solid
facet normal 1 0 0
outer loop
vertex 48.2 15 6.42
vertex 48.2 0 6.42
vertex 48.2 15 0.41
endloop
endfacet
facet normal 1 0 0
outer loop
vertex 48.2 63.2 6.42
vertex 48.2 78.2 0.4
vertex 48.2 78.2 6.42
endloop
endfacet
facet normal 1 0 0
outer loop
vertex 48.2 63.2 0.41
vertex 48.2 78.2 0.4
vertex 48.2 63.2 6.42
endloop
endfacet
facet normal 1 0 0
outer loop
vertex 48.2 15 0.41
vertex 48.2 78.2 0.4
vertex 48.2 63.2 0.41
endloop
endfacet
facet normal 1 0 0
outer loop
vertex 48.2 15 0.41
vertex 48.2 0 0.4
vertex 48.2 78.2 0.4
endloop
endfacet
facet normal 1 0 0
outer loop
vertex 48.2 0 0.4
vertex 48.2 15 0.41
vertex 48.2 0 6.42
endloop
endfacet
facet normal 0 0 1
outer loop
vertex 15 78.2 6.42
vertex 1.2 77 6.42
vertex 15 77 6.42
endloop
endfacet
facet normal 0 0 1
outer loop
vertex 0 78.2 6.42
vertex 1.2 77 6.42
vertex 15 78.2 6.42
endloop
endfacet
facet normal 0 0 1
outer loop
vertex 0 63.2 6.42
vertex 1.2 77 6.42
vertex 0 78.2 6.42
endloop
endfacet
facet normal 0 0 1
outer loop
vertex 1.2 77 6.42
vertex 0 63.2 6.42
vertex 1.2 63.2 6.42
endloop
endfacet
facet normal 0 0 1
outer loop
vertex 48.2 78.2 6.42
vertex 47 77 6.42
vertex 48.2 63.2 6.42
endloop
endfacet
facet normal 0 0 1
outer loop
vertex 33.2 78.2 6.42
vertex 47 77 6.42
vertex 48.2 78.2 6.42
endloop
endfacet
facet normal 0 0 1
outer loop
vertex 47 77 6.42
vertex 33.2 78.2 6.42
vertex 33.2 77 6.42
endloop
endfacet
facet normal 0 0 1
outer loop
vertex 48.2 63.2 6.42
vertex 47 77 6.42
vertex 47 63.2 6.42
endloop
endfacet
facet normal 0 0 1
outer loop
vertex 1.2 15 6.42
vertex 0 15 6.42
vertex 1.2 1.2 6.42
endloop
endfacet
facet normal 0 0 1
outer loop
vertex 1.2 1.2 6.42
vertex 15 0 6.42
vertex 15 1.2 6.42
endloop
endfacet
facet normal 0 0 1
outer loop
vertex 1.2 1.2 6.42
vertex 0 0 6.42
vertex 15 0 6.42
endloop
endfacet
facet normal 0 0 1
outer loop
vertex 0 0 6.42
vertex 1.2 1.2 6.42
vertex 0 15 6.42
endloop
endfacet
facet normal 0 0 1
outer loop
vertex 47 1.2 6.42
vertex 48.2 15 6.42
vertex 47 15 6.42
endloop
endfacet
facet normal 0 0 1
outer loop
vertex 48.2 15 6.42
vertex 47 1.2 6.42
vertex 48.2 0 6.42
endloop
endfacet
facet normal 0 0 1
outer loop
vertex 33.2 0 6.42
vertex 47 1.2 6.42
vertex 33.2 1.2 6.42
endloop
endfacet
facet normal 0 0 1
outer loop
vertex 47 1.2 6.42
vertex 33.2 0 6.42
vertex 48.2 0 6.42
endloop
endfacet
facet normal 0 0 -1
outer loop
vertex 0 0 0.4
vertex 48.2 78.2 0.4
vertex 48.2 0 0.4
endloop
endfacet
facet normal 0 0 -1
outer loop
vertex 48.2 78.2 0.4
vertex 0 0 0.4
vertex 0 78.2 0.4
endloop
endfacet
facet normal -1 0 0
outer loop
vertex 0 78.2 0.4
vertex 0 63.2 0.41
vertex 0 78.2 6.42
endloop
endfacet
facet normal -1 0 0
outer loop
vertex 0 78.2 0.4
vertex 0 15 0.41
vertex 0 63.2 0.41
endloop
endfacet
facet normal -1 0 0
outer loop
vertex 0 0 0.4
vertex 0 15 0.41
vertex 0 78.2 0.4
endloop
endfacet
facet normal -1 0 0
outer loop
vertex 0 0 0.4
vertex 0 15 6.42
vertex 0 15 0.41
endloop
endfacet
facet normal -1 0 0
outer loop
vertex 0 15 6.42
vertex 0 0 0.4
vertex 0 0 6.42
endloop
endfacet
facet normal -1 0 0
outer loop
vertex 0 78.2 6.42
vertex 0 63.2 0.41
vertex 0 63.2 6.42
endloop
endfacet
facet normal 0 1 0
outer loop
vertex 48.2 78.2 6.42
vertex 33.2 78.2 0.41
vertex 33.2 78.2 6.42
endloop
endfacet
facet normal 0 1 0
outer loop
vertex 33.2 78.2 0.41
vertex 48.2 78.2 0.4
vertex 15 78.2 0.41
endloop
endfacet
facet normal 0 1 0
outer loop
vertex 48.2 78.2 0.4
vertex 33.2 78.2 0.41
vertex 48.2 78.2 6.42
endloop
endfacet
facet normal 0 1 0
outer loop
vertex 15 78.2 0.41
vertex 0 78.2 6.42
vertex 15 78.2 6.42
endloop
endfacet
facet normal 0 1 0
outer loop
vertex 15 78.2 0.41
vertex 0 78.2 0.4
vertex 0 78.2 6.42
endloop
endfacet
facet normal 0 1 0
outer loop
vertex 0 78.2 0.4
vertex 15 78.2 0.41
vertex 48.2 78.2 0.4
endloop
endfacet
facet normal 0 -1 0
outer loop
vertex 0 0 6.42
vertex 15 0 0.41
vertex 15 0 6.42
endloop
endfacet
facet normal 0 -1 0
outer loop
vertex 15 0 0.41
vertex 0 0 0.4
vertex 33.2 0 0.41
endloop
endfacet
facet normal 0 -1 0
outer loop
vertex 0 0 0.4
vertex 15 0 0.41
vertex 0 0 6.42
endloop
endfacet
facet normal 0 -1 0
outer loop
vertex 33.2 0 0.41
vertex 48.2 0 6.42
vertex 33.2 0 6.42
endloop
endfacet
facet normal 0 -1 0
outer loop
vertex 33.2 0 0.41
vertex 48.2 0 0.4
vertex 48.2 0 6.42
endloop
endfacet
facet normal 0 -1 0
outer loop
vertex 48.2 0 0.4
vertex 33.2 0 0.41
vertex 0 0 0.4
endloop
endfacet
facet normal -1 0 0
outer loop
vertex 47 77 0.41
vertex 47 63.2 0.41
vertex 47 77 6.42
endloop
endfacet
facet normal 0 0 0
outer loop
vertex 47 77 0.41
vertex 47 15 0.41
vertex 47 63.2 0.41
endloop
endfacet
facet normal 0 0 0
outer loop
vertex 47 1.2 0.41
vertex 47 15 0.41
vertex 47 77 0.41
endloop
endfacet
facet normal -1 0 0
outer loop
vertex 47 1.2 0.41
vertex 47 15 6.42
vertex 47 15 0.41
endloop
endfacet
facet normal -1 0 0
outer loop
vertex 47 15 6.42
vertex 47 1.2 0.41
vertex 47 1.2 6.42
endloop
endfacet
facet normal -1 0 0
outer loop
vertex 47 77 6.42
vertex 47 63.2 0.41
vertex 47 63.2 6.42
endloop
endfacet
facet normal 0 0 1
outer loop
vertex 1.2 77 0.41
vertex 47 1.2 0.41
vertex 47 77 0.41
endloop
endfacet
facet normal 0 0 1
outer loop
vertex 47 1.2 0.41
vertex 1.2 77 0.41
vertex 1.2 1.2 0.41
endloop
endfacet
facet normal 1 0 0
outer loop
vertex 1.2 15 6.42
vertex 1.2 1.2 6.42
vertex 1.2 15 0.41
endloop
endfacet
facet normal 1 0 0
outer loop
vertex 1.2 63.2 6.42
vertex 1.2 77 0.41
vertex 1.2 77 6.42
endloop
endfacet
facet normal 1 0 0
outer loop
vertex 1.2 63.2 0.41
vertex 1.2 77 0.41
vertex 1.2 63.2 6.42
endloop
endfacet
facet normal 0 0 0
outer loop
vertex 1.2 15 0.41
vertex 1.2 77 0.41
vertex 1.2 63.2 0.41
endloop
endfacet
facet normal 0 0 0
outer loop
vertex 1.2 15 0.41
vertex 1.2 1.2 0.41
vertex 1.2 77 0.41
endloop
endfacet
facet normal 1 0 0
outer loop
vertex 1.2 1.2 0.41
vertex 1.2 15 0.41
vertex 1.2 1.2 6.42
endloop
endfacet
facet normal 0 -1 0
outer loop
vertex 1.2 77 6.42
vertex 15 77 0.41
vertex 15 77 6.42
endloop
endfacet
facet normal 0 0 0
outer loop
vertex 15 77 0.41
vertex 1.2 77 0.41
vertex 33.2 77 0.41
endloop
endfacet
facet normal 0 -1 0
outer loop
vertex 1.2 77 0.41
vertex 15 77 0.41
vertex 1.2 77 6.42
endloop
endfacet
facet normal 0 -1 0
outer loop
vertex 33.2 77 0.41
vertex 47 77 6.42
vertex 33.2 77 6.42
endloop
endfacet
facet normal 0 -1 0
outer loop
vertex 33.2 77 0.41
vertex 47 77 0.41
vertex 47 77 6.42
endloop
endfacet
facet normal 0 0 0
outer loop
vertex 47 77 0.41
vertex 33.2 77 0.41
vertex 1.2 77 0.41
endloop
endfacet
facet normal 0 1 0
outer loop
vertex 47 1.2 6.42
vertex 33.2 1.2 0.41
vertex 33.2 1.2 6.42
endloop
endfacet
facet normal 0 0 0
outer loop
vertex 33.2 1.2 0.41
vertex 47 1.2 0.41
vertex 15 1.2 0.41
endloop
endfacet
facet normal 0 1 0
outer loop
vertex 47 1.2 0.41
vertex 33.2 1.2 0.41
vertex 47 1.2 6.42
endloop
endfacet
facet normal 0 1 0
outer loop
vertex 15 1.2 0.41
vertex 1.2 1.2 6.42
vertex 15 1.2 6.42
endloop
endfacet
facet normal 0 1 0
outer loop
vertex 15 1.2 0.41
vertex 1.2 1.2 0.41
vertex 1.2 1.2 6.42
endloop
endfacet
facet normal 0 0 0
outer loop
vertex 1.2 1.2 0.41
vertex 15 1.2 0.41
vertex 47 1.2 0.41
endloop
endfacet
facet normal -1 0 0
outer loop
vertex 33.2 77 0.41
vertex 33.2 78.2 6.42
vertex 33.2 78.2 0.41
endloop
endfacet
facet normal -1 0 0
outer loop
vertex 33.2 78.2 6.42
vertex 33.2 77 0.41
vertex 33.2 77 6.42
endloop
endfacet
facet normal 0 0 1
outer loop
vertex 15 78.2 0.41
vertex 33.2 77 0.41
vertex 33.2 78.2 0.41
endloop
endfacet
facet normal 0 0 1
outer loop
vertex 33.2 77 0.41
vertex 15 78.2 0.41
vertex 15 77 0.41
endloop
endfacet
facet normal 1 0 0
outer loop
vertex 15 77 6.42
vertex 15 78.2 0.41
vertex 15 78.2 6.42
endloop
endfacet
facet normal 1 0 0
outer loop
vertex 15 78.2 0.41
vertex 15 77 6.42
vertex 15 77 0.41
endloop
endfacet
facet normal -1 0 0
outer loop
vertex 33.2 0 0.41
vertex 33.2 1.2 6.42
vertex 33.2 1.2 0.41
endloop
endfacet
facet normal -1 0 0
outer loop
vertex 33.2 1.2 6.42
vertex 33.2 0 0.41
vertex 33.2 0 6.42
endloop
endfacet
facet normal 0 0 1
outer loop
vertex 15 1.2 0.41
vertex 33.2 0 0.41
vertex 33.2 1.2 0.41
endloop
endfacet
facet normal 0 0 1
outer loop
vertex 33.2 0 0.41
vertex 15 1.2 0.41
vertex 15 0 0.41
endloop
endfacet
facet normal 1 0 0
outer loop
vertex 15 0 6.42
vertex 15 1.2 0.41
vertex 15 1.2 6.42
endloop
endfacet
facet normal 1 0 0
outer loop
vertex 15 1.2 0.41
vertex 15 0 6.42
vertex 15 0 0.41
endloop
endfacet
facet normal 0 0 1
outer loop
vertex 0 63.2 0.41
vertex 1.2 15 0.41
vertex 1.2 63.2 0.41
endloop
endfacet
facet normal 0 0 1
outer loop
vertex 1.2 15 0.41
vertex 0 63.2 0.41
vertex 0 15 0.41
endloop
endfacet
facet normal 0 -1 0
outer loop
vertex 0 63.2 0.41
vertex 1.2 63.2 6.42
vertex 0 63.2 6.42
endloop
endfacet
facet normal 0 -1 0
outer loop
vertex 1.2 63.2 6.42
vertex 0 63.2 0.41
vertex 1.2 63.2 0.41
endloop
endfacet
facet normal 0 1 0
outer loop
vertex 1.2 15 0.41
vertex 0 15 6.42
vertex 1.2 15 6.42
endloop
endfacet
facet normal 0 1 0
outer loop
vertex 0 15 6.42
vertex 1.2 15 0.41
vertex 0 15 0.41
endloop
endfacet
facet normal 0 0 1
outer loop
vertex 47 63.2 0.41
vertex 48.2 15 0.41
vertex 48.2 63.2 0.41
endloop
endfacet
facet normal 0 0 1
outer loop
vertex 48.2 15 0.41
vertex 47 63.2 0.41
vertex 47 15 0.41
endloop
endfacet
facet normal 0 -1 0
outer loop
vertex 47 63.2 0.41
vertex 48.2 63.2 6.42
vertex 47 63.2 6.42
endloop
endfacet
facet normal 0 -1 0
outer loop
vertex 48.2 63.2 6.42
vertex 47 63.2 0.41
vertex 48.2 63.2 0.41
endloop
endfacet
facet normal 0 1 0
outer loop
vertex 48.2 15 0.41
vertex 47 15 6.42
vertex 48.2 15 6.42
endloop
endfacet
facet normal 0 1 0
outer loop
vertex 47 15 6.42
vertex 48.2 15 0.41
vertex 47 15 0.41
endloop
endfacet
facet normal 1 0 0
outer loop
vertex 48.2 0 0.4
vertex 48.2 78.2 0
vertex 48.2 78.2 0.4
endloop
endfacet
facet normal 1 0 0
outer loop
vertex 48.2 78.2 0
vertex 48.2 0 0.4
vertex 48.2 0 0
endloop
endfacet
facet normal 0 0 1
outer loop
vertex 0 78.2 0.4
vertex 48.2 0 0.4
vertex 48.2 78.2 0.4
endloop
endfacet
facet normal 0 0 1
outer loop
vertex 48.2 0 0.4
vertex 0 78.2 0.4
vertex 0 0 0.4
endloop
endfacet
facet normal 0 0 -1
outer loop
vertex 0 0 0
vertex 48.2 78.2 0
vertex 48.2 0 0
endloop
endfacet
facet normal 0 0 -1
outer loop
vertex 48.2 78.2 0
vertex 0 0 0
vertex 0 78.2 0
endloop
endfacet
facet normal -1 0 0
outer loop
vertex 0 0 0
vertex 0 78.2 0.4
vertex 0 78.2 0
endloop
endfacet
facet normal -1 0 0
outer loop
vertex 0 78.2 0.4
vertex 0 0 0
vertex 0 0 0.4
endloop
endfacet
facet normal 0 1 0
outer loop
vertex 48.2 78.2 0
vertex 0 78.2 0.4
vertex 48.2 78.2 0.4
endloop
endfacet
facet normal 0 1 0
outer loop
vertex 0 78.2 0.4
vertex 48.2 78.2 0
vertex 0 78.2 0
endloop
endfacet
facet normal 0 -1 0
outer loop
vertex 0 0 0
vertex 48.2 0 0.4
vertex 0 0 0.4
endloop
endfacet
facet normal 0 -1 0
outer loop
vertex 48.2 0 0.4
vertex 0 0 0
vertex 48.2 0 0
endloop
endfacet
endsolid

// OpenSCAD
// file: ../../Base/Boxes.scad
// Fischertechnik Box Foundation
// Pre-designed Boxes

use <Constants.scad>

include <PlacementOptions.scad>

box190Width = 190;
box190Depth = 130;
box130Width = 130;
box130Depth = 95;
boxUsageHeight = 33.9;
boxWallThickness = 2.4;
boxBaseThickness = 1.0;
boxWebWidth = 3.0;

// getBoxWallThickness()
// Gets the wall thickness of a Fischertechnik Box

function getBoxWallThickness() = boxWallThickness;

// Gets the usable height of a fischertechnik box
function getBoxUsageHeight() = boxUsageHeight;

// Gets the thickness of the Fischertechnik box base.
function getBoxBaseThickness() = boxBaseThickness;

// Gets the width of a box web
function getBoxWebWidth() = boxWebWidth;

// Gets the usable inner space of a Box 190 as an x/y-list
function getBox190Space() = [
    box190Width - 2*getBoxWallThickness(), 
    box190Depth - 2*getBoxWallThickness() ];

// Imports the Fischertechnik empty box 130x190 mm and places it at position 0,0
// 190x130 are the outer sizes, the inner space is slightly smaller. Use getBox190Space() to get the inner sizes.
// This module needs the STL file "Fischertechnik Box 130x190.stl" in the library path.
// The box is positioned that the usable inner space is at the 0,0,0 position. The

module Box190() {
    translate([-getBoxWallThickness(),-getBoxWallThickness(),-getBoxBaseThickness()])
        import("Fischertechnik Box 130x190.stl", convexity=3);
}

// Gets the usable inner space of a Box 130 as an x/y-list
function getBox130Space() = [
    box130Width - 2*getBoxWallThickness(), 
    box130Depth - 2*getBoxWallThickness() ];

// Imports the Fischertechnik empty box 95x130 mm and places it at position 0,0
// 190x130 are the outer sizes, the inner space is slightly smaller. Use getBox190Space() to get the inner sizes.
// This module needs the STL file "Fischertechnik Box 95x130.stl" in the library path.
// The box is positioned that the usable inner space is at the 0,0,0 position. The

module Box130() {
    translate([-getBoxWallThickness(),-getBoxWallThickness(),-getBoxBaseThickness()])
        import("Fischertechnik Box 95x130.stl", convexity=3);
}

// Creates a web at the specified box walls
// corner 0 = LowerLeft, 1 = UpperLeft, 2 = UpperRight, 3 = LowerRight
// side 0 = LeftOfCorner, 1 = RightOfCorner
// distance = Distance in mm from the corner
// box = inner width and depth of the box (default: Box 190)
// webWidth = length of the web (default is 3 mms)
// webThickness = thickness of the web (default is 1 mm)

module BoxWeb(corner, side, distance, box=getBox190Space(), webWidth=getBoxWebWidth(), webThickness=1.0) {
    sink = getBoxWallThickness()/2;

    width = (corner % 2 == 0) ? 
            (side == LeftOfCorner ? webWidth : webThickness) :
            (side == LeftOfCorner ? webThickness : webWidth);

    depth = (corner % 2 == 0) ? 
            (side == RightOfCorner ? webWidth : webThickness) :
            (side == RightOfCorner ? webThickness : webWidth);
    
    xDiff = corner == LowerLeft ? 
                (side == LeftOfCorner ? -sink : distance) :
            (corner == UpperLeft ?                
                (side == LeftOfCorner ? distance : -sink) :
            (corner == UpperRight ?
                (side == LeftOfCorner ? box.x-webWidth+sink : box.x-distance-webThickness) :
                (side == LeftOfCorner ? box.x-distance-webThickness: box.x-webWidth+sink)));

    yDiff = corner == LowerLeft ? 
                (side == RightOfCorner ? -sink : distance) :
            (corner == UpperLeft ?
                (side == RightOfCorner ? box.y-distance : box.y-webWidth+sink) :
            (corner == UpperRight ?
                (side == RightOfCorner ? box.y-webWidth+sink : box.y-distance) :
                (side == RightOfCorner ? distance : -sink)));
    
    translate([xDiff, yDiff, -getExcess()])
        cube([width, depth, boxUsageHeight + 2*getExcess()]);
}
// file: ../../Base/Rotation.scad
// Fischertechnik Box Foundation
// Geometry Helpers Rotation

include <PlacementOptions.scad>

// getRotatedSpace(space, rotation=NoRotation)
// Rotates the space dependent on the specified rotation

function getRotatedSpace(space, rotation=NoRotation) = [
    (rotation == Rotate90 || rotation == Rotate270) ? space.y : space.x,
    (rotation == Rotate90 || rotation == Rotate270) ? space.x : space.y
];

// Rotates the given space around the fixed left lower corner
// space = the space the children needs as width/depth list [width,depth]
// rotation = 0 Rotate0 degrees, 1 Rotate90 degrees, 2 Rotate180 degrees, 3 Rotate270 degrees (equivalent to -90)

module RotateFix(space, rotation=Rotate0) {
    dy = (rotation == Rotate0 || rotation == Rotate270) ? 0 :
        (rotation == Rotate90) ? space.x :
        space.y;
    dx = (rotation < Rotate180) ? 0 :
        (rotation == Rotate180) ? space.x :
        space.y;
    
    translate([dx, dy, 0])
        rotate([0, 0, rotations[rotation]])
            children();
}
// file: ../../Base/Alignment.scad
// Fischertechnik Box Foundation
// Geometry Helpers Alignment

include <PlacementOptions.scad>

// getAlignedX(elementWidth, spaceWidth, align=AlignRight, offset=0)
// Gets the aligned X offset of an element with the given
// width in the given space.
// elementWidth = The width of the element to positon
// spaceWidth = The space where the element should be aligned
// align = 0 AlignLeft, 1 AlignCenter, 2 AlignRight
// offset = an optional offset from the aligned position. When
// aligned left or centered, then positive values are in X direction.
// When aligned right then positive values are in negative X direction.

function getAlignedX(elementWidth, spaceWidth, align=AlignRight, offset=0) =
    (align == AlignLeft) ?
        offset :
        ((align == AlignCenter) ?
        (spaceWidth - elementWidth)/2 + offset :
        spaceWidth - offset - elementWidth);

// getAlignedY(elementDepth, spaceDepth, align=AlignTop, offset=0)
// Gets the aligned Y offset of an element with the given
// depth in the given space.
// elementDepth = The depth of the element to positon
// spaceDepth = The space where the element should be aligned
// align = 0 AlignBottom, 1 AlignCenter, 2 AlignTop
// offset = an optional offset from the aligned position. When
// aligned bottom or centered, then positive values are in Y direction.
// When aligned top then positive values are in negative Y direction.

function getAlignedY(elementDepth, spaceDepth, align=AlignTop, offset=0) =
    (align == AlignBottom) ?
        offset :
        ((align == AlignCenter) ?
        (spaceDepth - elementDepth)/2 + offset :
        spaceDepth - offset - elementDepth);
// file: ../../Base/Placement.scad
// Fischertechnik Box Foundation
// Geometry Helpers Placement

use <Constants.scad>
use <Alignment.scad>
use <Rotation.scad>
use <Boxes.scad>

include <PlacementOptions.scad>

// Place(x=0, y=0, elementSpace=[0,0], alignX=AlignLeft, alignY=AlignBottom, rotation=Rotate0, boxSpace=getBox190Space())
// Places the child at the specified position
// y = Y-Position. This is a relative position when an X aligment is specified.
// x = X-Position. This is a relative position when an Y aligment is specified.
// elementSpace = space of the element to be placed [x,y]
// alignX = -1=NoAlign, 0 AlignLeft, 1 AlignCenter, 3 AlignRight (elementSpace and boxSpace required!)
// alignY = -1=NoAlign, 2 AlignBottom, 1 AlignCenter, 4 AlignTop (elementSpace and boxSpace required!)
// rotation = 0 Rotate0 0 degrees, 1 Rotate90 90 degrees, 
// 2 Rotate180 180 degrees, 3 Rotate270 270 degrees (equivalent to -90)
// boxSpace = Inner space of the box where the placement occurs [x,y] - default is Box 190x130 inner space

module Place(x=0, y=0, elementSpace=[0,0], 
  alignX=AlignLeft, alignY=AlignBottom, 
  rotation=NoRotation, boxSpace=getBox190Space()) {

    module Position(x, y, space, rotation=Rotate0) {
        translate([x, y, 0])
            RotateFix(space, rotation)
                children();
    }

    space = getRotatedSpace(elementSpace, rotation);
    alignedX = getAlignedX(space.x, boxSpace.x, alignX, x);
    alignedY = getAlignedY(space.y, boxSpace.y, alignY, y);
    Position(alignedX, alignedY, elementSpace, rotation)
        children();
}

// Center(space=getBox130Space(), elementSpace=[0,0])
// space = Space where the children is centered. For cylinder use centered=true and no elementSpace.
// elementSpace = space of the element to be centered [x,y]

module Center(space=getBox190Space(), elementSpace=[0,0]) {
    translate([(space.x - elementSpace.x) / 2, (space.y - elementSpace.y) / 2])
        children(0);
}

// CenterHorizontal(width=0, y=0, offset=0, space=getBox130Space())
// space = Space where the children is centered. For cylinder use centered=true and no elementSpace.
// elementSpace = space of the element to be centered [x,y]

module CenterHorizontal(width=0, y=0, offset=0, space=getBox190Space()) {
    translate([(space.x - width) / 2 + offset, y])
        children(0);
}

// CenterVertical(depth=0, x=0, offset=0, space=getBox130Space())
// space = Space where the children is centered. For cylinder use centered=true and no elementSpace.
// elementSpace = space of the element to be centered [x,y]

module CenterVertical(depth=0, x=0, offset=0, space=getBox190Space()) {
    translate([x, (space.y - depth) / 2 + offset])
        children(0);
}
// file: ../../Base/PlacementOptions.scad
// Fischertechnik Box Foundation
// Placement Options

// Alignment
NoAlign = 0;
AlignLeft = 1;
AlignBottom = 2;
AlignCenter = 3;
AlignRight = 4;
AlignTop = 5;

// Element rotation degree steps
rotations = [0, -90, -180, -270];

// Rotation
NoRotation = 0;
Rotate0 = 0;
Rotate90 = 1;
Rotate180 = 2;
Rotate270 = 3;

// Docking (seen from above)
NoDock = -1;
DockLeft = 0;
DockTop = 1;
DockRight = 2;
DockCorner = 2;
DockBottom = 3;

// Web corners
LowerLeft = 0;
UpperLeft = 1;
UpperRight = 2;
LowerRight = 3;

// Web position relative to corner
LeftOfCorner = 0;
RightOfCorner = 1;
// file: ../../Elements/AxisClip10.scad
// Fischertechnik Box Library
// Axis for clip 10
// 31023

use <../ModelBase/Simple.scad>

width = 12;
depth = 12;
height = 23;

// getAxisClip10Space()
// Gets the space of a frame for a clip 10 with spring ring (mot2)

function getAxisClip10Space() = [width, depth, height];

// AxisClip10()
// Axis for clip 10 with spring ring (mot2)

module AxisClip10() {
    LeveledAxisWithSpace(height, height-10, getAxisClip10Space());
}

// Tests
color("lightgray")
AxisClip10();
// file: ../../Base/Constants.scad
// Fischertechnik Box Foundation
// Constants

// Constant values necessary for multiple elements

// Base constants
dividerThickness = 1.2;
excess = 0.01;
fragments = 90;
tolerance = 0.8;

// Gets the thickness of a divider 
function getDividerThickness() = dividerThickness;

// Gets the excess that is used to merge walls into each other
function getExcess() = excess;

// Gets amount of fragments of a cylinder
function getFragments() = fragments;

// Gets the inner tolerance of a frame to each side
function getTolerance() = tolerance;


// Fischertechnik specific constants
axisDiameter = 4;
axisBottomDiameter = axisDiameter + 1;
standardEdgeDistance = 2.5;
standardWebDistance = 11.5;
standardCornerLength = 15;
tubeWallFactor = 0.8;

// Gets axis diameter
function getAxisDiameter() = axisDiameter;

// Gets axis bottom diameter for thicker part at the bottom
function getAxisBottomDiameter() = axisBottomDiameter;

// gets the standard distance to the wall of the box for dockable frames with webs
function getStandardEdgeDistance() = standardEdgeDistance;

// gets the standard distance of each web to the corner of the dockable frame
function getStandardWebDistance() = standardWebDistance;

// gets the standard length of the corner walls of a dockable frame
function getStandardCornerLength() = standardCornerLength;

// gets the wall thickness of a tube.
function getTubeWallThickness() = tubeWallFactor * getDividerThickness();
// file: ../../Elements/FrameElectronicBlock.scad
// Fischertechnik Box Library
// Frame for Electronic Blocks ("Silberlinge")
// 36391,36392,36393,36394,36479,36480,36481,36482,36483

use <../Base/Constants.scad>
use <../ModelBase/Simple.scad>
use <../ModelBase/Complex.scad>

include <../Base/PlacementOptions.scad>

width = 45;
depth = 75;
height = 6;

// getFrameCassetteSpace(edges)
// getFrameElectronicBlockSpace(alignX, alignY)
// alignX 0=NoAlign 1=AlignLeft 3=AlignCenter 4=AlignRight 
// alignY 0=AlignNo 2=AlignBottom 3=AlignCenter 5=AlignTop
// Gets the space the frame for a cassette needs as width and depth(.x and .y as a list). 

function getFrameElectronicBlockSpace(alignX=NoAlign, alignY=NoAlign) = 
    getDockableEdgedFrameSpace([width, depth, height], alignX, alignY);

// FrameElectronicBlock(alignX, alignY)
// Frame for cassette.
// alignX 0=NoAlign 1=AlignLeft 3=AlignCenter 4=AlignRight 
// alignY 0=AlignNo 2=AlignBottom 3=AlignCenter 5=AlignTop

module FrameElectronicBlock(alignX=NoAlign, alignY=NoAlign) {
    DockableEdgedFrame([width, depth, height], alignX, alignY);
}

// Test
color("lightgray") {
    FrameElectronicBlock();
}
// file: ../TestPrint.scad
// 3D Print Test Base

use <../Base/Constants.scad>

use <../Elements/AxisClip10.scad>

module TestPrint(elementSpace) {
    cube([elementSpace.x, elementSpace.y, 0.4]);
    translate([0,0,0.4+getExcess()]) {
        children();
    }
}

TestPrint(getAxisClip10Space())
    AxisClip10();
// main file
// 3D Print Test Base
// FrameElectronicBlock

use <../TestPrint.scad>
use <../../Elements/FrameElectronicBlock.scad>

TestPrint(getFrameElectronicBlockSpace())
    FrameElectronicBlock();
